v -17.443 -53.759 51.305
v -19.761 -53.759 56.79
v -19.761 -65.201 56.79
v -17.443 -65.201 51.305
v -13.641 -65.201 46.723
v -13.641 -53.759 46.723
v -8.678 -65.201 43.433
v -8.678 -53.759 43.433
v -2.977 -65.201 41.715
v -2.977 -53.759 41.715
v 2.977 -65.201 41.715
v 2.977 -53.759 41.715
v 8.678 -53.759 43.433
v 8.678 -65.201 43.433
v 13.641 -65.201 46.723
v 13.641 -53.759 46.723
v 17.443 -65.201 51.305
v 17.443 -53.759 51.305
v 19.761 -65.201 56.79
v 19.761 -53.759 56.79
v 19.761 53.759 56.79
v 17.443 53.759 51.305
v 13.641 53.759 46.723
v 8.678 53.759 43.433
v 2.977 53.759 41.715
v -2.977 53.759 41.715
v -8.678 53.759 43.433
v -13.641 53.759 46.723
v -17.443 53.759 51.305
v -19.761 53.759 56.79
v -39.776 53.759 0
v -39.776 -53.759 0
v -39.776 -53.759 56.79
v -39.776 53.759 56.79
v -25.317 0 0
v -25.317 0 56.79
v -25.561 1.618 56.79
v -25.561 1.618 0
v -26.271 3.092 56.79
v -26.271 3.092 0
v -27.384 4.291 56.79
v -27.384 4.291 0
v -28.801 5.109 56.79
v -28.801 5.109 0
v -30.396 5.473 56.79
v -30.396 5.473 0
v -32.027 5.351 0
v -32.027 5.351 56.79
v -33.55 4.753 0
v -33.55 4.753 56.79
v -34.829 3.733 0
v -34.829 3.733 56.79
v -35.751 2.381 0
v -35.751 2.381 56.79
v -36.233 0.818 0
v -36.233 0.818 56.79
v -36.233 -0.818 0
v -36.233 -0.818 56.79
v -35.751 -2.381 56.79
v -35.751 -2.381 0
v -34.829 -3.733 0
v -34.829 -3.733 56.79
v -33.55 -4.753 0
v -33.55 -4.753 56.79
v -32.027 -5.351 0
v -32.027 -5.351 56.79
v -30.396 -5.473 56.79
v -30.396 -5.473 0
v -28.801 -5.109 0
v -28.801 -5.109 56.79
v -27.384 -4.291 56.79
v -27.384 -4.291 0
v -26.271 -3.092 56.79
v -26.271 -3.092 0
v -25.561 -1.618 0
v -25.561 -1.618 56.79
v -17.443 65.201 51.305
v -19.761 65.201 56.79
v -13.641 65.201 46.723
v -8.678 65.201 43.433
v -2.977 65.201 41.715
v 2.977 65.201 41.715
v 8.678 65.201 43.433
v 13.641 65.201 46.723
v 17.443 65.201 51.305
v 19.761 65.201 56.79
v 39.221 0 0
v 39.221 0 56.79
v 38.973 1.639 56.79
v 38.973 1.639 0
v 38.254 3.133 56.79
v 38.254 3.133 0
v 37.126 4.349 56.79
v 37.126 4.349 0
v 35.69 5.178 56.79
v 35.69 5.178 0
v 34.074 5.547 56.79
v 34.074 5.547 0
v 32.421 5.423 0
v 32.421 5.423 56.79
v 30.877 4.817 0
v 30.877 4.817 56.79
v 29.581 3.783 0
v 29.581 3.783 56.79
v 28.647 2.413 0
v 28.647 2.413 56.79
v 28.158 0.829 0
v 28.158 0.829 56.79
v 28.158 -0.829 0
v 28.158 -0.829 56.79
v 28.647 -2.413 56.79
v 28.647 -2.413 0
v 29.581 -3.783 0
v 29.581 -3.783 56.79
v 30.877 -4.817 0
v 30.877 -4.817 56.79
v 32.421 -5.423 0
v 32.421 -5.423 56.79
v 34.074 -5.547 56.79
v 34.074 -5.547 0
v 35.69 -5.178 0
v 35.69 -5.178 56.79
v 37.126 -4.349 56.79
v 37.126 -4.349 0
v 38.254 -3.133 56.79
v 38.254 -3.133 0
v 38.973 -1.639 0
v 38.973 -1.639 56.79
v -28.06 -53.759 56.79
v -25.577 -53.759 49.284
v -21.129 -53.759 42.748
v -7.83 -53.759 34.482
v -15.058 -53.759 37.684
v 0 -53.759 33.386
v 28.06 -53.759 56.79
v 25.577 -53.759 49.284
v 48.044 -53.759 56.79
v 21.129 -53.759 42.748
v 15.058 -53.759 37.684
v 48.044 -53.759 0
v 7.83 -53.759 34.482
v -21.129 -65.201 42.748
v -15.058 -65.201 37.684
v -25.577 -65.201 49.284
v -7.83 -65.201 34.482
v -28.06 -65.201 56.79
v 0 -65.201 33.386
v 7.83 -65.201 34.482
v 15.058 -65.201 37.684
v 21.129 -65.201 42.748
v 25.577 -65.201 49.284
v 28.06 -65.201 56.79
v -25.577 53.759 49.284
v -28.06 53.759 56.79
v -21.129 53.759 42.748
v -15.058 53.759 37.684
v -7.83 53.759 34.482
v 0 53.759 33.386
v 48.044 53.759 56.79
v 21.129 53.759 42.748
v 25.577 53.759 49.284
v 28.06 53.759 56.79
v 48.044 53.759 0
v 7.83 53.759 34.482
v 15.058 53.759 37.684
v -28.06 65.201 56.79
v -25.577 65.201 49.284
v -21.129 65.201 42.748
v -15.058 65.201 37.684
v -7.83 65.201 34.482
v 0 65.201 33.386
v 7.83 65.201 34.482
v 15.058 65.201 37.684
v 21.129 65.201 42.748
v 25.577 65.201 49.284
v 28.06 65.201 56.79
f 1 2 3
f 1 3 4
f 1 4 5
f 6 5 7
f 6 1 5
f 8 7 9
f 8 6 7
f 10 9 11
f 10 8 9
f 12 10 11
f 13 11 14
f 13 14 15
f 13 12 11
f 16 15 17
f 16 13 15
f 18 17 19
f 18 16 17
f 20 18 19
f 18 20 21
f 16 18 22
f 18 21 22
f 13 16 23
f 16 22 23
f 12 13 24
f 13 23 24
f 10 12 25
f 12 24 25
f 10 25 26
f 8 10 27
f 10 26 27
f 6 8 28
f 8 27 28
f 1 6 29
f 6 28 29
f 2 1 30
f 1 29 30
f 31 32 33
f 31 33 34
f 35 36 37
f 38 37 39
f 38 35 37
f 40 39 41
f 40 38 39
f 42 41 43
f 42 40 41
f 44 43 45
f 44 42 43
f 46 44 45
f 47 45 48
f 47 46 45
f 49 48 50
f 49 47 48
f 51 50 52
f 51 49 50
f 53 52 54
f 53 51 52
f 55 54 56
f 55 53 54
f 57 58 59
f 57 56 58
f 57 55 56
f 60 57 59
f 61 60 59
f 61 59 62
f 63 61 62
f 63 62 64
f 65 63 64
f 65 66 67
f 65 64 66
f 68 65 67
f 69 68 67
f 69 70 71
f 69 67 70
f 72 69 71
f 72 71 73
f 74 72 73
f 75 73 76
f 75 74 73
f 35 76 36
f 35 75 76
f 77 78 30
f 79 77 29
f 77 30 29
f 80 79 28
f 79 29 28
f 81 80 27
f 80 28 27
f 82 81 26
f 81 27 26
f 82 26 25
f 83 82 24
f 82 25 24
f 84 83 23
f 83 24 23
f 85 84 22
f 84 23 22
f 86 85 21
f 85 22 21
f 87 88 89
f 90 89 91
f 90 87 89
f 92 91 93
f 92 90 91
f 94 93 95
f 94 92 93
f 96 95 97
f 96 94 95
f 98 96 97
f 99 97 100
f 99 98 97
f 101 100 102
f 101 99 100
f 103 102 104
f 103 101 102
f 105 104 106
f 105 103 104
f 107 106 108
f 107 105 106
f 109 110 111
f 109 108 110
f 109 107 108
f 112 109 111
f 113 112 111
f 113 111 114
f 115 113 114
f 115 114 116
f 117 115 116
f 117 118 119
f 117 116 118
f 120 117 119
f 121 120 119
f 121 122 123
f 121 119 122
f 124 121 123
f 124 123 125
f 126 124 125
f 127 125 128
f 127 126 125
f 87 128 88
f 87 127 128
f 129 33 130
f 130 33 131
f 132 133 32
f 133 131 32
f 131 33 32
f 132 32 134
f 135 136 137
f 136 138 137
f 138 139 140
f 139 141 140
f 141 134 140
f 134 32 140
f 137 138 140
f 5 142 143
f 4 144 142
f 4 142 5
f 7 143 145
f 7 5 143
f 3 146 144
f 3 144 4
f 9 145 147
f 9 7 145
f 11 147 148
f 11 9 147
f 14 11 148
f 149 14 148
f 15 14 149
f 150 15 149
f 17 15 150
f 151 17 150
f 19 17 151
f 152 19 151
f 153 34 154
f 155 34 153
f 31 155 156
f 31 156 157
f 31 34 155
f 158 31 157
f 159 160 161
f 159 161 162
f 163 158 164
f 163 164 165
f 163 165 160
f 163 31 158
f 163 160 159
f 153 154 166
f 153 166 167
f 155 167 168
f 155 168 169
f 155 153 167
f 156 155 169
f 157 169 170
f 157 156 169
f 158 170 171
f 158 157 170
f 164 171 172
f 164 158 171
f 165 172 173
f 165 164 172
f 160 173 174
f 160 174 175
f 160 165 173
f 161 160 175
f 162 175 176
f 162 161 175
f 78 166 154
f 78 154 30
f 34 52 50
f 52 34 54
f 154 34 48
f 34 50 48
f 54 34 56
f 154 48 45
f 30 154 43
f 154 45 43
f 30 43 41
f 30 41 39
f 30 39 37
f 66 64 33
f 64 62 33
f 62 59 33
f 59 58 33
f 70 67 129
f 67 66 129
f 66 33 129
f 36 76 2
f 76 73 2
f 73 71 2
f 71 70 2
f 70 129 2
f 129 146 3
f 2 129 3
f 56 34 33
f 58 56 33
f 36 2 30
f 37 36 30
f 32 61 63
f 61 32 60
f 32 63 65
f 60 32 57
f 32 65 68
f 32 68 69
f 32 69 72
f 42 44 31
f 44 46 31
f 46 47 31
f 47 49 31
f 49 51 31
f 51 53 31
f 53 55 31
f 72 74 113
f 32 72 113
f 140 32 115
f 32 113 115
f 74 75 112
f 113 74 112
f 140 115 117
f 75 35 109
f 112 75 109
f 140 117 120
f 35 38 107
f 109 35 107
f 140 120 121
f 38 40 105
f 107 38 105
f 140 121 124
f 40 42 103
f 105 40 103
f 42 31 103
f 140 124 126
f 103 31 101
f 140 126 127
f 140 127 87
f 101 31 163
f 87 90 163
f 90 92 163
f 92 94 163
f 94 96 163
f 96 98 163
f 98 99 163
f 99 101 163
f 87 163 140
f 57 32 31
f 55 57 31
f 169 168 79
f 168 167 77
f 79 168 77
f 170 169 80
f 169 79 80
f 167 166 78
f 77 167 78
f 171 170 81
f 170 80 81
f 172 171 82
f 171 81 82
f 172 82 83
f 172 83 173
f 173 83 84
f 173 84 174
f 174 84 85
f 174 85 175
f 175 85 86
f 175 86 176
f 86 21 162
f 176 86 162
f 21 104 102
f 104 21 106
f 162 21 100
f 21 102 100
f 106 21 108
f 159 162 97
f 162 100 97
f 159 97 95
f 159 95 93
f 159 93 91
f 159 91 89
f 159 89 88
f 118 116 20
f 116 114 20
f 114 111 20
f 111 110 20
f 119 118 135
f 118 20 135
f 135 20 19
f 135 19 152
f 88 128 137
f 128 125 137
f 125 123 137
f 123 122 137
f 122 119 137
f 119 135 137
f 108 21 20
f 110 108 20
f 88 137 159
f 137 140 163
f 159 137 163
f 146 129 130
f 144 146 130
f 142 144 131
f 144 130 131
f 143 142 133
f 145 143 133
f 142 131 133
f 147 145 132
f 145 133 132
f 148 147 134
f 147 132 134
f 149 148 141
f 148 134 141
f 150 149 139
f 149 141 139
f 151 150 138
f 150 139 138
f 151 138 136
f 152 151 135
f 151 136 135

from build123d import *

# Parameters (mm, degrees)
F0_W     = 87.819647
F0_H     = 93.559742
F0_R     = 4.613034
F0_R_2   = 4.621613
F1_DEPTH = 109.474
F2_R     = 28.523138
F2_R_2   = 20.412925
F3_DEPTH = 25.4
F5_W     = 138.989549
F5_H     = 60.892661
F6_DEPTH = 76.2
F7_DEPTH = 118.960742
F8_R     = 5.562192
F8_R_2   = 5.488567
F9_DEPTH = 56.790789


with BuildPart() as f1:
    # F0 (on Top) → F1 (new body)
    with BuildSketch(Plane.XY):
        with Locations((4.134112, 6.978657)):
            Rectangle(F0_W, F0_H)
        with Locations((-32.668188, 13.385462)):
            Circle(F0_R, mode=Mode.SUBTRACT)
        with Locations((36.83091, 13.385462)):
            Circle(F0_R_2, mode=Mode.SUBTRACT)
    extrude(amount=F1_DEPTH)

    # F2 (on face) → F3 (join)
    with BuildSketch(Plane.XZ.offset(39.801214)):
        with Locations((0, 61.909173)):
            Circle(F2_R)
        with Locations((0, 61.909173)):
            Circle(F2_R_2, mode=Mode.SUBTRACT)
    extrude(amount=F3_DEPTH)

    # F4: F1 across plane


with BuildPart() as f1_1:
    add(f1.part)
    add(f1.part.mirror(Plane.XZ))

    # F5 (on Front) → F6 (cut, symmetric)
    with BuildSketch(Plane.XZ):
        with Locations((8.737327, 87.23612)):
            Rectangle(F5_W, F5_H)
    extrude(amount=F6_DEPTH, both=True, mode=Mode.SUBTRACT)

    # F4_face (on face) → F7 (cut, through all)
    with BuildSketch(Plane(origin=(0, 53.758528, 50.420232), x_dir=(-1, 0, 0), z_dir=(0, 1, 0))):
        with BuildLine():
            Line((19.760552, 6.369557), (-19.760552, 6.369557))
            ThreePointArc((-19.760552, 6.369557), (0, -8.923984), (19.760552, 6.369557))
        make_face()
    extrude(amount=-F7_DEPTH, mode=Mode.SUBTRACT)

    # F8 (on Top) → F9 (cut, through all)
    with BuildSketch(Plane.XY):
        with Locations((33.658396, 0)):
            Circle(F8_R)
        with Locations((-30.80599, 0)):
            Circle(F8_R_2)
    extrude(amount=F9_DEPTH, mode=Mode.SUBTRACT)


solid = f1_1.part
